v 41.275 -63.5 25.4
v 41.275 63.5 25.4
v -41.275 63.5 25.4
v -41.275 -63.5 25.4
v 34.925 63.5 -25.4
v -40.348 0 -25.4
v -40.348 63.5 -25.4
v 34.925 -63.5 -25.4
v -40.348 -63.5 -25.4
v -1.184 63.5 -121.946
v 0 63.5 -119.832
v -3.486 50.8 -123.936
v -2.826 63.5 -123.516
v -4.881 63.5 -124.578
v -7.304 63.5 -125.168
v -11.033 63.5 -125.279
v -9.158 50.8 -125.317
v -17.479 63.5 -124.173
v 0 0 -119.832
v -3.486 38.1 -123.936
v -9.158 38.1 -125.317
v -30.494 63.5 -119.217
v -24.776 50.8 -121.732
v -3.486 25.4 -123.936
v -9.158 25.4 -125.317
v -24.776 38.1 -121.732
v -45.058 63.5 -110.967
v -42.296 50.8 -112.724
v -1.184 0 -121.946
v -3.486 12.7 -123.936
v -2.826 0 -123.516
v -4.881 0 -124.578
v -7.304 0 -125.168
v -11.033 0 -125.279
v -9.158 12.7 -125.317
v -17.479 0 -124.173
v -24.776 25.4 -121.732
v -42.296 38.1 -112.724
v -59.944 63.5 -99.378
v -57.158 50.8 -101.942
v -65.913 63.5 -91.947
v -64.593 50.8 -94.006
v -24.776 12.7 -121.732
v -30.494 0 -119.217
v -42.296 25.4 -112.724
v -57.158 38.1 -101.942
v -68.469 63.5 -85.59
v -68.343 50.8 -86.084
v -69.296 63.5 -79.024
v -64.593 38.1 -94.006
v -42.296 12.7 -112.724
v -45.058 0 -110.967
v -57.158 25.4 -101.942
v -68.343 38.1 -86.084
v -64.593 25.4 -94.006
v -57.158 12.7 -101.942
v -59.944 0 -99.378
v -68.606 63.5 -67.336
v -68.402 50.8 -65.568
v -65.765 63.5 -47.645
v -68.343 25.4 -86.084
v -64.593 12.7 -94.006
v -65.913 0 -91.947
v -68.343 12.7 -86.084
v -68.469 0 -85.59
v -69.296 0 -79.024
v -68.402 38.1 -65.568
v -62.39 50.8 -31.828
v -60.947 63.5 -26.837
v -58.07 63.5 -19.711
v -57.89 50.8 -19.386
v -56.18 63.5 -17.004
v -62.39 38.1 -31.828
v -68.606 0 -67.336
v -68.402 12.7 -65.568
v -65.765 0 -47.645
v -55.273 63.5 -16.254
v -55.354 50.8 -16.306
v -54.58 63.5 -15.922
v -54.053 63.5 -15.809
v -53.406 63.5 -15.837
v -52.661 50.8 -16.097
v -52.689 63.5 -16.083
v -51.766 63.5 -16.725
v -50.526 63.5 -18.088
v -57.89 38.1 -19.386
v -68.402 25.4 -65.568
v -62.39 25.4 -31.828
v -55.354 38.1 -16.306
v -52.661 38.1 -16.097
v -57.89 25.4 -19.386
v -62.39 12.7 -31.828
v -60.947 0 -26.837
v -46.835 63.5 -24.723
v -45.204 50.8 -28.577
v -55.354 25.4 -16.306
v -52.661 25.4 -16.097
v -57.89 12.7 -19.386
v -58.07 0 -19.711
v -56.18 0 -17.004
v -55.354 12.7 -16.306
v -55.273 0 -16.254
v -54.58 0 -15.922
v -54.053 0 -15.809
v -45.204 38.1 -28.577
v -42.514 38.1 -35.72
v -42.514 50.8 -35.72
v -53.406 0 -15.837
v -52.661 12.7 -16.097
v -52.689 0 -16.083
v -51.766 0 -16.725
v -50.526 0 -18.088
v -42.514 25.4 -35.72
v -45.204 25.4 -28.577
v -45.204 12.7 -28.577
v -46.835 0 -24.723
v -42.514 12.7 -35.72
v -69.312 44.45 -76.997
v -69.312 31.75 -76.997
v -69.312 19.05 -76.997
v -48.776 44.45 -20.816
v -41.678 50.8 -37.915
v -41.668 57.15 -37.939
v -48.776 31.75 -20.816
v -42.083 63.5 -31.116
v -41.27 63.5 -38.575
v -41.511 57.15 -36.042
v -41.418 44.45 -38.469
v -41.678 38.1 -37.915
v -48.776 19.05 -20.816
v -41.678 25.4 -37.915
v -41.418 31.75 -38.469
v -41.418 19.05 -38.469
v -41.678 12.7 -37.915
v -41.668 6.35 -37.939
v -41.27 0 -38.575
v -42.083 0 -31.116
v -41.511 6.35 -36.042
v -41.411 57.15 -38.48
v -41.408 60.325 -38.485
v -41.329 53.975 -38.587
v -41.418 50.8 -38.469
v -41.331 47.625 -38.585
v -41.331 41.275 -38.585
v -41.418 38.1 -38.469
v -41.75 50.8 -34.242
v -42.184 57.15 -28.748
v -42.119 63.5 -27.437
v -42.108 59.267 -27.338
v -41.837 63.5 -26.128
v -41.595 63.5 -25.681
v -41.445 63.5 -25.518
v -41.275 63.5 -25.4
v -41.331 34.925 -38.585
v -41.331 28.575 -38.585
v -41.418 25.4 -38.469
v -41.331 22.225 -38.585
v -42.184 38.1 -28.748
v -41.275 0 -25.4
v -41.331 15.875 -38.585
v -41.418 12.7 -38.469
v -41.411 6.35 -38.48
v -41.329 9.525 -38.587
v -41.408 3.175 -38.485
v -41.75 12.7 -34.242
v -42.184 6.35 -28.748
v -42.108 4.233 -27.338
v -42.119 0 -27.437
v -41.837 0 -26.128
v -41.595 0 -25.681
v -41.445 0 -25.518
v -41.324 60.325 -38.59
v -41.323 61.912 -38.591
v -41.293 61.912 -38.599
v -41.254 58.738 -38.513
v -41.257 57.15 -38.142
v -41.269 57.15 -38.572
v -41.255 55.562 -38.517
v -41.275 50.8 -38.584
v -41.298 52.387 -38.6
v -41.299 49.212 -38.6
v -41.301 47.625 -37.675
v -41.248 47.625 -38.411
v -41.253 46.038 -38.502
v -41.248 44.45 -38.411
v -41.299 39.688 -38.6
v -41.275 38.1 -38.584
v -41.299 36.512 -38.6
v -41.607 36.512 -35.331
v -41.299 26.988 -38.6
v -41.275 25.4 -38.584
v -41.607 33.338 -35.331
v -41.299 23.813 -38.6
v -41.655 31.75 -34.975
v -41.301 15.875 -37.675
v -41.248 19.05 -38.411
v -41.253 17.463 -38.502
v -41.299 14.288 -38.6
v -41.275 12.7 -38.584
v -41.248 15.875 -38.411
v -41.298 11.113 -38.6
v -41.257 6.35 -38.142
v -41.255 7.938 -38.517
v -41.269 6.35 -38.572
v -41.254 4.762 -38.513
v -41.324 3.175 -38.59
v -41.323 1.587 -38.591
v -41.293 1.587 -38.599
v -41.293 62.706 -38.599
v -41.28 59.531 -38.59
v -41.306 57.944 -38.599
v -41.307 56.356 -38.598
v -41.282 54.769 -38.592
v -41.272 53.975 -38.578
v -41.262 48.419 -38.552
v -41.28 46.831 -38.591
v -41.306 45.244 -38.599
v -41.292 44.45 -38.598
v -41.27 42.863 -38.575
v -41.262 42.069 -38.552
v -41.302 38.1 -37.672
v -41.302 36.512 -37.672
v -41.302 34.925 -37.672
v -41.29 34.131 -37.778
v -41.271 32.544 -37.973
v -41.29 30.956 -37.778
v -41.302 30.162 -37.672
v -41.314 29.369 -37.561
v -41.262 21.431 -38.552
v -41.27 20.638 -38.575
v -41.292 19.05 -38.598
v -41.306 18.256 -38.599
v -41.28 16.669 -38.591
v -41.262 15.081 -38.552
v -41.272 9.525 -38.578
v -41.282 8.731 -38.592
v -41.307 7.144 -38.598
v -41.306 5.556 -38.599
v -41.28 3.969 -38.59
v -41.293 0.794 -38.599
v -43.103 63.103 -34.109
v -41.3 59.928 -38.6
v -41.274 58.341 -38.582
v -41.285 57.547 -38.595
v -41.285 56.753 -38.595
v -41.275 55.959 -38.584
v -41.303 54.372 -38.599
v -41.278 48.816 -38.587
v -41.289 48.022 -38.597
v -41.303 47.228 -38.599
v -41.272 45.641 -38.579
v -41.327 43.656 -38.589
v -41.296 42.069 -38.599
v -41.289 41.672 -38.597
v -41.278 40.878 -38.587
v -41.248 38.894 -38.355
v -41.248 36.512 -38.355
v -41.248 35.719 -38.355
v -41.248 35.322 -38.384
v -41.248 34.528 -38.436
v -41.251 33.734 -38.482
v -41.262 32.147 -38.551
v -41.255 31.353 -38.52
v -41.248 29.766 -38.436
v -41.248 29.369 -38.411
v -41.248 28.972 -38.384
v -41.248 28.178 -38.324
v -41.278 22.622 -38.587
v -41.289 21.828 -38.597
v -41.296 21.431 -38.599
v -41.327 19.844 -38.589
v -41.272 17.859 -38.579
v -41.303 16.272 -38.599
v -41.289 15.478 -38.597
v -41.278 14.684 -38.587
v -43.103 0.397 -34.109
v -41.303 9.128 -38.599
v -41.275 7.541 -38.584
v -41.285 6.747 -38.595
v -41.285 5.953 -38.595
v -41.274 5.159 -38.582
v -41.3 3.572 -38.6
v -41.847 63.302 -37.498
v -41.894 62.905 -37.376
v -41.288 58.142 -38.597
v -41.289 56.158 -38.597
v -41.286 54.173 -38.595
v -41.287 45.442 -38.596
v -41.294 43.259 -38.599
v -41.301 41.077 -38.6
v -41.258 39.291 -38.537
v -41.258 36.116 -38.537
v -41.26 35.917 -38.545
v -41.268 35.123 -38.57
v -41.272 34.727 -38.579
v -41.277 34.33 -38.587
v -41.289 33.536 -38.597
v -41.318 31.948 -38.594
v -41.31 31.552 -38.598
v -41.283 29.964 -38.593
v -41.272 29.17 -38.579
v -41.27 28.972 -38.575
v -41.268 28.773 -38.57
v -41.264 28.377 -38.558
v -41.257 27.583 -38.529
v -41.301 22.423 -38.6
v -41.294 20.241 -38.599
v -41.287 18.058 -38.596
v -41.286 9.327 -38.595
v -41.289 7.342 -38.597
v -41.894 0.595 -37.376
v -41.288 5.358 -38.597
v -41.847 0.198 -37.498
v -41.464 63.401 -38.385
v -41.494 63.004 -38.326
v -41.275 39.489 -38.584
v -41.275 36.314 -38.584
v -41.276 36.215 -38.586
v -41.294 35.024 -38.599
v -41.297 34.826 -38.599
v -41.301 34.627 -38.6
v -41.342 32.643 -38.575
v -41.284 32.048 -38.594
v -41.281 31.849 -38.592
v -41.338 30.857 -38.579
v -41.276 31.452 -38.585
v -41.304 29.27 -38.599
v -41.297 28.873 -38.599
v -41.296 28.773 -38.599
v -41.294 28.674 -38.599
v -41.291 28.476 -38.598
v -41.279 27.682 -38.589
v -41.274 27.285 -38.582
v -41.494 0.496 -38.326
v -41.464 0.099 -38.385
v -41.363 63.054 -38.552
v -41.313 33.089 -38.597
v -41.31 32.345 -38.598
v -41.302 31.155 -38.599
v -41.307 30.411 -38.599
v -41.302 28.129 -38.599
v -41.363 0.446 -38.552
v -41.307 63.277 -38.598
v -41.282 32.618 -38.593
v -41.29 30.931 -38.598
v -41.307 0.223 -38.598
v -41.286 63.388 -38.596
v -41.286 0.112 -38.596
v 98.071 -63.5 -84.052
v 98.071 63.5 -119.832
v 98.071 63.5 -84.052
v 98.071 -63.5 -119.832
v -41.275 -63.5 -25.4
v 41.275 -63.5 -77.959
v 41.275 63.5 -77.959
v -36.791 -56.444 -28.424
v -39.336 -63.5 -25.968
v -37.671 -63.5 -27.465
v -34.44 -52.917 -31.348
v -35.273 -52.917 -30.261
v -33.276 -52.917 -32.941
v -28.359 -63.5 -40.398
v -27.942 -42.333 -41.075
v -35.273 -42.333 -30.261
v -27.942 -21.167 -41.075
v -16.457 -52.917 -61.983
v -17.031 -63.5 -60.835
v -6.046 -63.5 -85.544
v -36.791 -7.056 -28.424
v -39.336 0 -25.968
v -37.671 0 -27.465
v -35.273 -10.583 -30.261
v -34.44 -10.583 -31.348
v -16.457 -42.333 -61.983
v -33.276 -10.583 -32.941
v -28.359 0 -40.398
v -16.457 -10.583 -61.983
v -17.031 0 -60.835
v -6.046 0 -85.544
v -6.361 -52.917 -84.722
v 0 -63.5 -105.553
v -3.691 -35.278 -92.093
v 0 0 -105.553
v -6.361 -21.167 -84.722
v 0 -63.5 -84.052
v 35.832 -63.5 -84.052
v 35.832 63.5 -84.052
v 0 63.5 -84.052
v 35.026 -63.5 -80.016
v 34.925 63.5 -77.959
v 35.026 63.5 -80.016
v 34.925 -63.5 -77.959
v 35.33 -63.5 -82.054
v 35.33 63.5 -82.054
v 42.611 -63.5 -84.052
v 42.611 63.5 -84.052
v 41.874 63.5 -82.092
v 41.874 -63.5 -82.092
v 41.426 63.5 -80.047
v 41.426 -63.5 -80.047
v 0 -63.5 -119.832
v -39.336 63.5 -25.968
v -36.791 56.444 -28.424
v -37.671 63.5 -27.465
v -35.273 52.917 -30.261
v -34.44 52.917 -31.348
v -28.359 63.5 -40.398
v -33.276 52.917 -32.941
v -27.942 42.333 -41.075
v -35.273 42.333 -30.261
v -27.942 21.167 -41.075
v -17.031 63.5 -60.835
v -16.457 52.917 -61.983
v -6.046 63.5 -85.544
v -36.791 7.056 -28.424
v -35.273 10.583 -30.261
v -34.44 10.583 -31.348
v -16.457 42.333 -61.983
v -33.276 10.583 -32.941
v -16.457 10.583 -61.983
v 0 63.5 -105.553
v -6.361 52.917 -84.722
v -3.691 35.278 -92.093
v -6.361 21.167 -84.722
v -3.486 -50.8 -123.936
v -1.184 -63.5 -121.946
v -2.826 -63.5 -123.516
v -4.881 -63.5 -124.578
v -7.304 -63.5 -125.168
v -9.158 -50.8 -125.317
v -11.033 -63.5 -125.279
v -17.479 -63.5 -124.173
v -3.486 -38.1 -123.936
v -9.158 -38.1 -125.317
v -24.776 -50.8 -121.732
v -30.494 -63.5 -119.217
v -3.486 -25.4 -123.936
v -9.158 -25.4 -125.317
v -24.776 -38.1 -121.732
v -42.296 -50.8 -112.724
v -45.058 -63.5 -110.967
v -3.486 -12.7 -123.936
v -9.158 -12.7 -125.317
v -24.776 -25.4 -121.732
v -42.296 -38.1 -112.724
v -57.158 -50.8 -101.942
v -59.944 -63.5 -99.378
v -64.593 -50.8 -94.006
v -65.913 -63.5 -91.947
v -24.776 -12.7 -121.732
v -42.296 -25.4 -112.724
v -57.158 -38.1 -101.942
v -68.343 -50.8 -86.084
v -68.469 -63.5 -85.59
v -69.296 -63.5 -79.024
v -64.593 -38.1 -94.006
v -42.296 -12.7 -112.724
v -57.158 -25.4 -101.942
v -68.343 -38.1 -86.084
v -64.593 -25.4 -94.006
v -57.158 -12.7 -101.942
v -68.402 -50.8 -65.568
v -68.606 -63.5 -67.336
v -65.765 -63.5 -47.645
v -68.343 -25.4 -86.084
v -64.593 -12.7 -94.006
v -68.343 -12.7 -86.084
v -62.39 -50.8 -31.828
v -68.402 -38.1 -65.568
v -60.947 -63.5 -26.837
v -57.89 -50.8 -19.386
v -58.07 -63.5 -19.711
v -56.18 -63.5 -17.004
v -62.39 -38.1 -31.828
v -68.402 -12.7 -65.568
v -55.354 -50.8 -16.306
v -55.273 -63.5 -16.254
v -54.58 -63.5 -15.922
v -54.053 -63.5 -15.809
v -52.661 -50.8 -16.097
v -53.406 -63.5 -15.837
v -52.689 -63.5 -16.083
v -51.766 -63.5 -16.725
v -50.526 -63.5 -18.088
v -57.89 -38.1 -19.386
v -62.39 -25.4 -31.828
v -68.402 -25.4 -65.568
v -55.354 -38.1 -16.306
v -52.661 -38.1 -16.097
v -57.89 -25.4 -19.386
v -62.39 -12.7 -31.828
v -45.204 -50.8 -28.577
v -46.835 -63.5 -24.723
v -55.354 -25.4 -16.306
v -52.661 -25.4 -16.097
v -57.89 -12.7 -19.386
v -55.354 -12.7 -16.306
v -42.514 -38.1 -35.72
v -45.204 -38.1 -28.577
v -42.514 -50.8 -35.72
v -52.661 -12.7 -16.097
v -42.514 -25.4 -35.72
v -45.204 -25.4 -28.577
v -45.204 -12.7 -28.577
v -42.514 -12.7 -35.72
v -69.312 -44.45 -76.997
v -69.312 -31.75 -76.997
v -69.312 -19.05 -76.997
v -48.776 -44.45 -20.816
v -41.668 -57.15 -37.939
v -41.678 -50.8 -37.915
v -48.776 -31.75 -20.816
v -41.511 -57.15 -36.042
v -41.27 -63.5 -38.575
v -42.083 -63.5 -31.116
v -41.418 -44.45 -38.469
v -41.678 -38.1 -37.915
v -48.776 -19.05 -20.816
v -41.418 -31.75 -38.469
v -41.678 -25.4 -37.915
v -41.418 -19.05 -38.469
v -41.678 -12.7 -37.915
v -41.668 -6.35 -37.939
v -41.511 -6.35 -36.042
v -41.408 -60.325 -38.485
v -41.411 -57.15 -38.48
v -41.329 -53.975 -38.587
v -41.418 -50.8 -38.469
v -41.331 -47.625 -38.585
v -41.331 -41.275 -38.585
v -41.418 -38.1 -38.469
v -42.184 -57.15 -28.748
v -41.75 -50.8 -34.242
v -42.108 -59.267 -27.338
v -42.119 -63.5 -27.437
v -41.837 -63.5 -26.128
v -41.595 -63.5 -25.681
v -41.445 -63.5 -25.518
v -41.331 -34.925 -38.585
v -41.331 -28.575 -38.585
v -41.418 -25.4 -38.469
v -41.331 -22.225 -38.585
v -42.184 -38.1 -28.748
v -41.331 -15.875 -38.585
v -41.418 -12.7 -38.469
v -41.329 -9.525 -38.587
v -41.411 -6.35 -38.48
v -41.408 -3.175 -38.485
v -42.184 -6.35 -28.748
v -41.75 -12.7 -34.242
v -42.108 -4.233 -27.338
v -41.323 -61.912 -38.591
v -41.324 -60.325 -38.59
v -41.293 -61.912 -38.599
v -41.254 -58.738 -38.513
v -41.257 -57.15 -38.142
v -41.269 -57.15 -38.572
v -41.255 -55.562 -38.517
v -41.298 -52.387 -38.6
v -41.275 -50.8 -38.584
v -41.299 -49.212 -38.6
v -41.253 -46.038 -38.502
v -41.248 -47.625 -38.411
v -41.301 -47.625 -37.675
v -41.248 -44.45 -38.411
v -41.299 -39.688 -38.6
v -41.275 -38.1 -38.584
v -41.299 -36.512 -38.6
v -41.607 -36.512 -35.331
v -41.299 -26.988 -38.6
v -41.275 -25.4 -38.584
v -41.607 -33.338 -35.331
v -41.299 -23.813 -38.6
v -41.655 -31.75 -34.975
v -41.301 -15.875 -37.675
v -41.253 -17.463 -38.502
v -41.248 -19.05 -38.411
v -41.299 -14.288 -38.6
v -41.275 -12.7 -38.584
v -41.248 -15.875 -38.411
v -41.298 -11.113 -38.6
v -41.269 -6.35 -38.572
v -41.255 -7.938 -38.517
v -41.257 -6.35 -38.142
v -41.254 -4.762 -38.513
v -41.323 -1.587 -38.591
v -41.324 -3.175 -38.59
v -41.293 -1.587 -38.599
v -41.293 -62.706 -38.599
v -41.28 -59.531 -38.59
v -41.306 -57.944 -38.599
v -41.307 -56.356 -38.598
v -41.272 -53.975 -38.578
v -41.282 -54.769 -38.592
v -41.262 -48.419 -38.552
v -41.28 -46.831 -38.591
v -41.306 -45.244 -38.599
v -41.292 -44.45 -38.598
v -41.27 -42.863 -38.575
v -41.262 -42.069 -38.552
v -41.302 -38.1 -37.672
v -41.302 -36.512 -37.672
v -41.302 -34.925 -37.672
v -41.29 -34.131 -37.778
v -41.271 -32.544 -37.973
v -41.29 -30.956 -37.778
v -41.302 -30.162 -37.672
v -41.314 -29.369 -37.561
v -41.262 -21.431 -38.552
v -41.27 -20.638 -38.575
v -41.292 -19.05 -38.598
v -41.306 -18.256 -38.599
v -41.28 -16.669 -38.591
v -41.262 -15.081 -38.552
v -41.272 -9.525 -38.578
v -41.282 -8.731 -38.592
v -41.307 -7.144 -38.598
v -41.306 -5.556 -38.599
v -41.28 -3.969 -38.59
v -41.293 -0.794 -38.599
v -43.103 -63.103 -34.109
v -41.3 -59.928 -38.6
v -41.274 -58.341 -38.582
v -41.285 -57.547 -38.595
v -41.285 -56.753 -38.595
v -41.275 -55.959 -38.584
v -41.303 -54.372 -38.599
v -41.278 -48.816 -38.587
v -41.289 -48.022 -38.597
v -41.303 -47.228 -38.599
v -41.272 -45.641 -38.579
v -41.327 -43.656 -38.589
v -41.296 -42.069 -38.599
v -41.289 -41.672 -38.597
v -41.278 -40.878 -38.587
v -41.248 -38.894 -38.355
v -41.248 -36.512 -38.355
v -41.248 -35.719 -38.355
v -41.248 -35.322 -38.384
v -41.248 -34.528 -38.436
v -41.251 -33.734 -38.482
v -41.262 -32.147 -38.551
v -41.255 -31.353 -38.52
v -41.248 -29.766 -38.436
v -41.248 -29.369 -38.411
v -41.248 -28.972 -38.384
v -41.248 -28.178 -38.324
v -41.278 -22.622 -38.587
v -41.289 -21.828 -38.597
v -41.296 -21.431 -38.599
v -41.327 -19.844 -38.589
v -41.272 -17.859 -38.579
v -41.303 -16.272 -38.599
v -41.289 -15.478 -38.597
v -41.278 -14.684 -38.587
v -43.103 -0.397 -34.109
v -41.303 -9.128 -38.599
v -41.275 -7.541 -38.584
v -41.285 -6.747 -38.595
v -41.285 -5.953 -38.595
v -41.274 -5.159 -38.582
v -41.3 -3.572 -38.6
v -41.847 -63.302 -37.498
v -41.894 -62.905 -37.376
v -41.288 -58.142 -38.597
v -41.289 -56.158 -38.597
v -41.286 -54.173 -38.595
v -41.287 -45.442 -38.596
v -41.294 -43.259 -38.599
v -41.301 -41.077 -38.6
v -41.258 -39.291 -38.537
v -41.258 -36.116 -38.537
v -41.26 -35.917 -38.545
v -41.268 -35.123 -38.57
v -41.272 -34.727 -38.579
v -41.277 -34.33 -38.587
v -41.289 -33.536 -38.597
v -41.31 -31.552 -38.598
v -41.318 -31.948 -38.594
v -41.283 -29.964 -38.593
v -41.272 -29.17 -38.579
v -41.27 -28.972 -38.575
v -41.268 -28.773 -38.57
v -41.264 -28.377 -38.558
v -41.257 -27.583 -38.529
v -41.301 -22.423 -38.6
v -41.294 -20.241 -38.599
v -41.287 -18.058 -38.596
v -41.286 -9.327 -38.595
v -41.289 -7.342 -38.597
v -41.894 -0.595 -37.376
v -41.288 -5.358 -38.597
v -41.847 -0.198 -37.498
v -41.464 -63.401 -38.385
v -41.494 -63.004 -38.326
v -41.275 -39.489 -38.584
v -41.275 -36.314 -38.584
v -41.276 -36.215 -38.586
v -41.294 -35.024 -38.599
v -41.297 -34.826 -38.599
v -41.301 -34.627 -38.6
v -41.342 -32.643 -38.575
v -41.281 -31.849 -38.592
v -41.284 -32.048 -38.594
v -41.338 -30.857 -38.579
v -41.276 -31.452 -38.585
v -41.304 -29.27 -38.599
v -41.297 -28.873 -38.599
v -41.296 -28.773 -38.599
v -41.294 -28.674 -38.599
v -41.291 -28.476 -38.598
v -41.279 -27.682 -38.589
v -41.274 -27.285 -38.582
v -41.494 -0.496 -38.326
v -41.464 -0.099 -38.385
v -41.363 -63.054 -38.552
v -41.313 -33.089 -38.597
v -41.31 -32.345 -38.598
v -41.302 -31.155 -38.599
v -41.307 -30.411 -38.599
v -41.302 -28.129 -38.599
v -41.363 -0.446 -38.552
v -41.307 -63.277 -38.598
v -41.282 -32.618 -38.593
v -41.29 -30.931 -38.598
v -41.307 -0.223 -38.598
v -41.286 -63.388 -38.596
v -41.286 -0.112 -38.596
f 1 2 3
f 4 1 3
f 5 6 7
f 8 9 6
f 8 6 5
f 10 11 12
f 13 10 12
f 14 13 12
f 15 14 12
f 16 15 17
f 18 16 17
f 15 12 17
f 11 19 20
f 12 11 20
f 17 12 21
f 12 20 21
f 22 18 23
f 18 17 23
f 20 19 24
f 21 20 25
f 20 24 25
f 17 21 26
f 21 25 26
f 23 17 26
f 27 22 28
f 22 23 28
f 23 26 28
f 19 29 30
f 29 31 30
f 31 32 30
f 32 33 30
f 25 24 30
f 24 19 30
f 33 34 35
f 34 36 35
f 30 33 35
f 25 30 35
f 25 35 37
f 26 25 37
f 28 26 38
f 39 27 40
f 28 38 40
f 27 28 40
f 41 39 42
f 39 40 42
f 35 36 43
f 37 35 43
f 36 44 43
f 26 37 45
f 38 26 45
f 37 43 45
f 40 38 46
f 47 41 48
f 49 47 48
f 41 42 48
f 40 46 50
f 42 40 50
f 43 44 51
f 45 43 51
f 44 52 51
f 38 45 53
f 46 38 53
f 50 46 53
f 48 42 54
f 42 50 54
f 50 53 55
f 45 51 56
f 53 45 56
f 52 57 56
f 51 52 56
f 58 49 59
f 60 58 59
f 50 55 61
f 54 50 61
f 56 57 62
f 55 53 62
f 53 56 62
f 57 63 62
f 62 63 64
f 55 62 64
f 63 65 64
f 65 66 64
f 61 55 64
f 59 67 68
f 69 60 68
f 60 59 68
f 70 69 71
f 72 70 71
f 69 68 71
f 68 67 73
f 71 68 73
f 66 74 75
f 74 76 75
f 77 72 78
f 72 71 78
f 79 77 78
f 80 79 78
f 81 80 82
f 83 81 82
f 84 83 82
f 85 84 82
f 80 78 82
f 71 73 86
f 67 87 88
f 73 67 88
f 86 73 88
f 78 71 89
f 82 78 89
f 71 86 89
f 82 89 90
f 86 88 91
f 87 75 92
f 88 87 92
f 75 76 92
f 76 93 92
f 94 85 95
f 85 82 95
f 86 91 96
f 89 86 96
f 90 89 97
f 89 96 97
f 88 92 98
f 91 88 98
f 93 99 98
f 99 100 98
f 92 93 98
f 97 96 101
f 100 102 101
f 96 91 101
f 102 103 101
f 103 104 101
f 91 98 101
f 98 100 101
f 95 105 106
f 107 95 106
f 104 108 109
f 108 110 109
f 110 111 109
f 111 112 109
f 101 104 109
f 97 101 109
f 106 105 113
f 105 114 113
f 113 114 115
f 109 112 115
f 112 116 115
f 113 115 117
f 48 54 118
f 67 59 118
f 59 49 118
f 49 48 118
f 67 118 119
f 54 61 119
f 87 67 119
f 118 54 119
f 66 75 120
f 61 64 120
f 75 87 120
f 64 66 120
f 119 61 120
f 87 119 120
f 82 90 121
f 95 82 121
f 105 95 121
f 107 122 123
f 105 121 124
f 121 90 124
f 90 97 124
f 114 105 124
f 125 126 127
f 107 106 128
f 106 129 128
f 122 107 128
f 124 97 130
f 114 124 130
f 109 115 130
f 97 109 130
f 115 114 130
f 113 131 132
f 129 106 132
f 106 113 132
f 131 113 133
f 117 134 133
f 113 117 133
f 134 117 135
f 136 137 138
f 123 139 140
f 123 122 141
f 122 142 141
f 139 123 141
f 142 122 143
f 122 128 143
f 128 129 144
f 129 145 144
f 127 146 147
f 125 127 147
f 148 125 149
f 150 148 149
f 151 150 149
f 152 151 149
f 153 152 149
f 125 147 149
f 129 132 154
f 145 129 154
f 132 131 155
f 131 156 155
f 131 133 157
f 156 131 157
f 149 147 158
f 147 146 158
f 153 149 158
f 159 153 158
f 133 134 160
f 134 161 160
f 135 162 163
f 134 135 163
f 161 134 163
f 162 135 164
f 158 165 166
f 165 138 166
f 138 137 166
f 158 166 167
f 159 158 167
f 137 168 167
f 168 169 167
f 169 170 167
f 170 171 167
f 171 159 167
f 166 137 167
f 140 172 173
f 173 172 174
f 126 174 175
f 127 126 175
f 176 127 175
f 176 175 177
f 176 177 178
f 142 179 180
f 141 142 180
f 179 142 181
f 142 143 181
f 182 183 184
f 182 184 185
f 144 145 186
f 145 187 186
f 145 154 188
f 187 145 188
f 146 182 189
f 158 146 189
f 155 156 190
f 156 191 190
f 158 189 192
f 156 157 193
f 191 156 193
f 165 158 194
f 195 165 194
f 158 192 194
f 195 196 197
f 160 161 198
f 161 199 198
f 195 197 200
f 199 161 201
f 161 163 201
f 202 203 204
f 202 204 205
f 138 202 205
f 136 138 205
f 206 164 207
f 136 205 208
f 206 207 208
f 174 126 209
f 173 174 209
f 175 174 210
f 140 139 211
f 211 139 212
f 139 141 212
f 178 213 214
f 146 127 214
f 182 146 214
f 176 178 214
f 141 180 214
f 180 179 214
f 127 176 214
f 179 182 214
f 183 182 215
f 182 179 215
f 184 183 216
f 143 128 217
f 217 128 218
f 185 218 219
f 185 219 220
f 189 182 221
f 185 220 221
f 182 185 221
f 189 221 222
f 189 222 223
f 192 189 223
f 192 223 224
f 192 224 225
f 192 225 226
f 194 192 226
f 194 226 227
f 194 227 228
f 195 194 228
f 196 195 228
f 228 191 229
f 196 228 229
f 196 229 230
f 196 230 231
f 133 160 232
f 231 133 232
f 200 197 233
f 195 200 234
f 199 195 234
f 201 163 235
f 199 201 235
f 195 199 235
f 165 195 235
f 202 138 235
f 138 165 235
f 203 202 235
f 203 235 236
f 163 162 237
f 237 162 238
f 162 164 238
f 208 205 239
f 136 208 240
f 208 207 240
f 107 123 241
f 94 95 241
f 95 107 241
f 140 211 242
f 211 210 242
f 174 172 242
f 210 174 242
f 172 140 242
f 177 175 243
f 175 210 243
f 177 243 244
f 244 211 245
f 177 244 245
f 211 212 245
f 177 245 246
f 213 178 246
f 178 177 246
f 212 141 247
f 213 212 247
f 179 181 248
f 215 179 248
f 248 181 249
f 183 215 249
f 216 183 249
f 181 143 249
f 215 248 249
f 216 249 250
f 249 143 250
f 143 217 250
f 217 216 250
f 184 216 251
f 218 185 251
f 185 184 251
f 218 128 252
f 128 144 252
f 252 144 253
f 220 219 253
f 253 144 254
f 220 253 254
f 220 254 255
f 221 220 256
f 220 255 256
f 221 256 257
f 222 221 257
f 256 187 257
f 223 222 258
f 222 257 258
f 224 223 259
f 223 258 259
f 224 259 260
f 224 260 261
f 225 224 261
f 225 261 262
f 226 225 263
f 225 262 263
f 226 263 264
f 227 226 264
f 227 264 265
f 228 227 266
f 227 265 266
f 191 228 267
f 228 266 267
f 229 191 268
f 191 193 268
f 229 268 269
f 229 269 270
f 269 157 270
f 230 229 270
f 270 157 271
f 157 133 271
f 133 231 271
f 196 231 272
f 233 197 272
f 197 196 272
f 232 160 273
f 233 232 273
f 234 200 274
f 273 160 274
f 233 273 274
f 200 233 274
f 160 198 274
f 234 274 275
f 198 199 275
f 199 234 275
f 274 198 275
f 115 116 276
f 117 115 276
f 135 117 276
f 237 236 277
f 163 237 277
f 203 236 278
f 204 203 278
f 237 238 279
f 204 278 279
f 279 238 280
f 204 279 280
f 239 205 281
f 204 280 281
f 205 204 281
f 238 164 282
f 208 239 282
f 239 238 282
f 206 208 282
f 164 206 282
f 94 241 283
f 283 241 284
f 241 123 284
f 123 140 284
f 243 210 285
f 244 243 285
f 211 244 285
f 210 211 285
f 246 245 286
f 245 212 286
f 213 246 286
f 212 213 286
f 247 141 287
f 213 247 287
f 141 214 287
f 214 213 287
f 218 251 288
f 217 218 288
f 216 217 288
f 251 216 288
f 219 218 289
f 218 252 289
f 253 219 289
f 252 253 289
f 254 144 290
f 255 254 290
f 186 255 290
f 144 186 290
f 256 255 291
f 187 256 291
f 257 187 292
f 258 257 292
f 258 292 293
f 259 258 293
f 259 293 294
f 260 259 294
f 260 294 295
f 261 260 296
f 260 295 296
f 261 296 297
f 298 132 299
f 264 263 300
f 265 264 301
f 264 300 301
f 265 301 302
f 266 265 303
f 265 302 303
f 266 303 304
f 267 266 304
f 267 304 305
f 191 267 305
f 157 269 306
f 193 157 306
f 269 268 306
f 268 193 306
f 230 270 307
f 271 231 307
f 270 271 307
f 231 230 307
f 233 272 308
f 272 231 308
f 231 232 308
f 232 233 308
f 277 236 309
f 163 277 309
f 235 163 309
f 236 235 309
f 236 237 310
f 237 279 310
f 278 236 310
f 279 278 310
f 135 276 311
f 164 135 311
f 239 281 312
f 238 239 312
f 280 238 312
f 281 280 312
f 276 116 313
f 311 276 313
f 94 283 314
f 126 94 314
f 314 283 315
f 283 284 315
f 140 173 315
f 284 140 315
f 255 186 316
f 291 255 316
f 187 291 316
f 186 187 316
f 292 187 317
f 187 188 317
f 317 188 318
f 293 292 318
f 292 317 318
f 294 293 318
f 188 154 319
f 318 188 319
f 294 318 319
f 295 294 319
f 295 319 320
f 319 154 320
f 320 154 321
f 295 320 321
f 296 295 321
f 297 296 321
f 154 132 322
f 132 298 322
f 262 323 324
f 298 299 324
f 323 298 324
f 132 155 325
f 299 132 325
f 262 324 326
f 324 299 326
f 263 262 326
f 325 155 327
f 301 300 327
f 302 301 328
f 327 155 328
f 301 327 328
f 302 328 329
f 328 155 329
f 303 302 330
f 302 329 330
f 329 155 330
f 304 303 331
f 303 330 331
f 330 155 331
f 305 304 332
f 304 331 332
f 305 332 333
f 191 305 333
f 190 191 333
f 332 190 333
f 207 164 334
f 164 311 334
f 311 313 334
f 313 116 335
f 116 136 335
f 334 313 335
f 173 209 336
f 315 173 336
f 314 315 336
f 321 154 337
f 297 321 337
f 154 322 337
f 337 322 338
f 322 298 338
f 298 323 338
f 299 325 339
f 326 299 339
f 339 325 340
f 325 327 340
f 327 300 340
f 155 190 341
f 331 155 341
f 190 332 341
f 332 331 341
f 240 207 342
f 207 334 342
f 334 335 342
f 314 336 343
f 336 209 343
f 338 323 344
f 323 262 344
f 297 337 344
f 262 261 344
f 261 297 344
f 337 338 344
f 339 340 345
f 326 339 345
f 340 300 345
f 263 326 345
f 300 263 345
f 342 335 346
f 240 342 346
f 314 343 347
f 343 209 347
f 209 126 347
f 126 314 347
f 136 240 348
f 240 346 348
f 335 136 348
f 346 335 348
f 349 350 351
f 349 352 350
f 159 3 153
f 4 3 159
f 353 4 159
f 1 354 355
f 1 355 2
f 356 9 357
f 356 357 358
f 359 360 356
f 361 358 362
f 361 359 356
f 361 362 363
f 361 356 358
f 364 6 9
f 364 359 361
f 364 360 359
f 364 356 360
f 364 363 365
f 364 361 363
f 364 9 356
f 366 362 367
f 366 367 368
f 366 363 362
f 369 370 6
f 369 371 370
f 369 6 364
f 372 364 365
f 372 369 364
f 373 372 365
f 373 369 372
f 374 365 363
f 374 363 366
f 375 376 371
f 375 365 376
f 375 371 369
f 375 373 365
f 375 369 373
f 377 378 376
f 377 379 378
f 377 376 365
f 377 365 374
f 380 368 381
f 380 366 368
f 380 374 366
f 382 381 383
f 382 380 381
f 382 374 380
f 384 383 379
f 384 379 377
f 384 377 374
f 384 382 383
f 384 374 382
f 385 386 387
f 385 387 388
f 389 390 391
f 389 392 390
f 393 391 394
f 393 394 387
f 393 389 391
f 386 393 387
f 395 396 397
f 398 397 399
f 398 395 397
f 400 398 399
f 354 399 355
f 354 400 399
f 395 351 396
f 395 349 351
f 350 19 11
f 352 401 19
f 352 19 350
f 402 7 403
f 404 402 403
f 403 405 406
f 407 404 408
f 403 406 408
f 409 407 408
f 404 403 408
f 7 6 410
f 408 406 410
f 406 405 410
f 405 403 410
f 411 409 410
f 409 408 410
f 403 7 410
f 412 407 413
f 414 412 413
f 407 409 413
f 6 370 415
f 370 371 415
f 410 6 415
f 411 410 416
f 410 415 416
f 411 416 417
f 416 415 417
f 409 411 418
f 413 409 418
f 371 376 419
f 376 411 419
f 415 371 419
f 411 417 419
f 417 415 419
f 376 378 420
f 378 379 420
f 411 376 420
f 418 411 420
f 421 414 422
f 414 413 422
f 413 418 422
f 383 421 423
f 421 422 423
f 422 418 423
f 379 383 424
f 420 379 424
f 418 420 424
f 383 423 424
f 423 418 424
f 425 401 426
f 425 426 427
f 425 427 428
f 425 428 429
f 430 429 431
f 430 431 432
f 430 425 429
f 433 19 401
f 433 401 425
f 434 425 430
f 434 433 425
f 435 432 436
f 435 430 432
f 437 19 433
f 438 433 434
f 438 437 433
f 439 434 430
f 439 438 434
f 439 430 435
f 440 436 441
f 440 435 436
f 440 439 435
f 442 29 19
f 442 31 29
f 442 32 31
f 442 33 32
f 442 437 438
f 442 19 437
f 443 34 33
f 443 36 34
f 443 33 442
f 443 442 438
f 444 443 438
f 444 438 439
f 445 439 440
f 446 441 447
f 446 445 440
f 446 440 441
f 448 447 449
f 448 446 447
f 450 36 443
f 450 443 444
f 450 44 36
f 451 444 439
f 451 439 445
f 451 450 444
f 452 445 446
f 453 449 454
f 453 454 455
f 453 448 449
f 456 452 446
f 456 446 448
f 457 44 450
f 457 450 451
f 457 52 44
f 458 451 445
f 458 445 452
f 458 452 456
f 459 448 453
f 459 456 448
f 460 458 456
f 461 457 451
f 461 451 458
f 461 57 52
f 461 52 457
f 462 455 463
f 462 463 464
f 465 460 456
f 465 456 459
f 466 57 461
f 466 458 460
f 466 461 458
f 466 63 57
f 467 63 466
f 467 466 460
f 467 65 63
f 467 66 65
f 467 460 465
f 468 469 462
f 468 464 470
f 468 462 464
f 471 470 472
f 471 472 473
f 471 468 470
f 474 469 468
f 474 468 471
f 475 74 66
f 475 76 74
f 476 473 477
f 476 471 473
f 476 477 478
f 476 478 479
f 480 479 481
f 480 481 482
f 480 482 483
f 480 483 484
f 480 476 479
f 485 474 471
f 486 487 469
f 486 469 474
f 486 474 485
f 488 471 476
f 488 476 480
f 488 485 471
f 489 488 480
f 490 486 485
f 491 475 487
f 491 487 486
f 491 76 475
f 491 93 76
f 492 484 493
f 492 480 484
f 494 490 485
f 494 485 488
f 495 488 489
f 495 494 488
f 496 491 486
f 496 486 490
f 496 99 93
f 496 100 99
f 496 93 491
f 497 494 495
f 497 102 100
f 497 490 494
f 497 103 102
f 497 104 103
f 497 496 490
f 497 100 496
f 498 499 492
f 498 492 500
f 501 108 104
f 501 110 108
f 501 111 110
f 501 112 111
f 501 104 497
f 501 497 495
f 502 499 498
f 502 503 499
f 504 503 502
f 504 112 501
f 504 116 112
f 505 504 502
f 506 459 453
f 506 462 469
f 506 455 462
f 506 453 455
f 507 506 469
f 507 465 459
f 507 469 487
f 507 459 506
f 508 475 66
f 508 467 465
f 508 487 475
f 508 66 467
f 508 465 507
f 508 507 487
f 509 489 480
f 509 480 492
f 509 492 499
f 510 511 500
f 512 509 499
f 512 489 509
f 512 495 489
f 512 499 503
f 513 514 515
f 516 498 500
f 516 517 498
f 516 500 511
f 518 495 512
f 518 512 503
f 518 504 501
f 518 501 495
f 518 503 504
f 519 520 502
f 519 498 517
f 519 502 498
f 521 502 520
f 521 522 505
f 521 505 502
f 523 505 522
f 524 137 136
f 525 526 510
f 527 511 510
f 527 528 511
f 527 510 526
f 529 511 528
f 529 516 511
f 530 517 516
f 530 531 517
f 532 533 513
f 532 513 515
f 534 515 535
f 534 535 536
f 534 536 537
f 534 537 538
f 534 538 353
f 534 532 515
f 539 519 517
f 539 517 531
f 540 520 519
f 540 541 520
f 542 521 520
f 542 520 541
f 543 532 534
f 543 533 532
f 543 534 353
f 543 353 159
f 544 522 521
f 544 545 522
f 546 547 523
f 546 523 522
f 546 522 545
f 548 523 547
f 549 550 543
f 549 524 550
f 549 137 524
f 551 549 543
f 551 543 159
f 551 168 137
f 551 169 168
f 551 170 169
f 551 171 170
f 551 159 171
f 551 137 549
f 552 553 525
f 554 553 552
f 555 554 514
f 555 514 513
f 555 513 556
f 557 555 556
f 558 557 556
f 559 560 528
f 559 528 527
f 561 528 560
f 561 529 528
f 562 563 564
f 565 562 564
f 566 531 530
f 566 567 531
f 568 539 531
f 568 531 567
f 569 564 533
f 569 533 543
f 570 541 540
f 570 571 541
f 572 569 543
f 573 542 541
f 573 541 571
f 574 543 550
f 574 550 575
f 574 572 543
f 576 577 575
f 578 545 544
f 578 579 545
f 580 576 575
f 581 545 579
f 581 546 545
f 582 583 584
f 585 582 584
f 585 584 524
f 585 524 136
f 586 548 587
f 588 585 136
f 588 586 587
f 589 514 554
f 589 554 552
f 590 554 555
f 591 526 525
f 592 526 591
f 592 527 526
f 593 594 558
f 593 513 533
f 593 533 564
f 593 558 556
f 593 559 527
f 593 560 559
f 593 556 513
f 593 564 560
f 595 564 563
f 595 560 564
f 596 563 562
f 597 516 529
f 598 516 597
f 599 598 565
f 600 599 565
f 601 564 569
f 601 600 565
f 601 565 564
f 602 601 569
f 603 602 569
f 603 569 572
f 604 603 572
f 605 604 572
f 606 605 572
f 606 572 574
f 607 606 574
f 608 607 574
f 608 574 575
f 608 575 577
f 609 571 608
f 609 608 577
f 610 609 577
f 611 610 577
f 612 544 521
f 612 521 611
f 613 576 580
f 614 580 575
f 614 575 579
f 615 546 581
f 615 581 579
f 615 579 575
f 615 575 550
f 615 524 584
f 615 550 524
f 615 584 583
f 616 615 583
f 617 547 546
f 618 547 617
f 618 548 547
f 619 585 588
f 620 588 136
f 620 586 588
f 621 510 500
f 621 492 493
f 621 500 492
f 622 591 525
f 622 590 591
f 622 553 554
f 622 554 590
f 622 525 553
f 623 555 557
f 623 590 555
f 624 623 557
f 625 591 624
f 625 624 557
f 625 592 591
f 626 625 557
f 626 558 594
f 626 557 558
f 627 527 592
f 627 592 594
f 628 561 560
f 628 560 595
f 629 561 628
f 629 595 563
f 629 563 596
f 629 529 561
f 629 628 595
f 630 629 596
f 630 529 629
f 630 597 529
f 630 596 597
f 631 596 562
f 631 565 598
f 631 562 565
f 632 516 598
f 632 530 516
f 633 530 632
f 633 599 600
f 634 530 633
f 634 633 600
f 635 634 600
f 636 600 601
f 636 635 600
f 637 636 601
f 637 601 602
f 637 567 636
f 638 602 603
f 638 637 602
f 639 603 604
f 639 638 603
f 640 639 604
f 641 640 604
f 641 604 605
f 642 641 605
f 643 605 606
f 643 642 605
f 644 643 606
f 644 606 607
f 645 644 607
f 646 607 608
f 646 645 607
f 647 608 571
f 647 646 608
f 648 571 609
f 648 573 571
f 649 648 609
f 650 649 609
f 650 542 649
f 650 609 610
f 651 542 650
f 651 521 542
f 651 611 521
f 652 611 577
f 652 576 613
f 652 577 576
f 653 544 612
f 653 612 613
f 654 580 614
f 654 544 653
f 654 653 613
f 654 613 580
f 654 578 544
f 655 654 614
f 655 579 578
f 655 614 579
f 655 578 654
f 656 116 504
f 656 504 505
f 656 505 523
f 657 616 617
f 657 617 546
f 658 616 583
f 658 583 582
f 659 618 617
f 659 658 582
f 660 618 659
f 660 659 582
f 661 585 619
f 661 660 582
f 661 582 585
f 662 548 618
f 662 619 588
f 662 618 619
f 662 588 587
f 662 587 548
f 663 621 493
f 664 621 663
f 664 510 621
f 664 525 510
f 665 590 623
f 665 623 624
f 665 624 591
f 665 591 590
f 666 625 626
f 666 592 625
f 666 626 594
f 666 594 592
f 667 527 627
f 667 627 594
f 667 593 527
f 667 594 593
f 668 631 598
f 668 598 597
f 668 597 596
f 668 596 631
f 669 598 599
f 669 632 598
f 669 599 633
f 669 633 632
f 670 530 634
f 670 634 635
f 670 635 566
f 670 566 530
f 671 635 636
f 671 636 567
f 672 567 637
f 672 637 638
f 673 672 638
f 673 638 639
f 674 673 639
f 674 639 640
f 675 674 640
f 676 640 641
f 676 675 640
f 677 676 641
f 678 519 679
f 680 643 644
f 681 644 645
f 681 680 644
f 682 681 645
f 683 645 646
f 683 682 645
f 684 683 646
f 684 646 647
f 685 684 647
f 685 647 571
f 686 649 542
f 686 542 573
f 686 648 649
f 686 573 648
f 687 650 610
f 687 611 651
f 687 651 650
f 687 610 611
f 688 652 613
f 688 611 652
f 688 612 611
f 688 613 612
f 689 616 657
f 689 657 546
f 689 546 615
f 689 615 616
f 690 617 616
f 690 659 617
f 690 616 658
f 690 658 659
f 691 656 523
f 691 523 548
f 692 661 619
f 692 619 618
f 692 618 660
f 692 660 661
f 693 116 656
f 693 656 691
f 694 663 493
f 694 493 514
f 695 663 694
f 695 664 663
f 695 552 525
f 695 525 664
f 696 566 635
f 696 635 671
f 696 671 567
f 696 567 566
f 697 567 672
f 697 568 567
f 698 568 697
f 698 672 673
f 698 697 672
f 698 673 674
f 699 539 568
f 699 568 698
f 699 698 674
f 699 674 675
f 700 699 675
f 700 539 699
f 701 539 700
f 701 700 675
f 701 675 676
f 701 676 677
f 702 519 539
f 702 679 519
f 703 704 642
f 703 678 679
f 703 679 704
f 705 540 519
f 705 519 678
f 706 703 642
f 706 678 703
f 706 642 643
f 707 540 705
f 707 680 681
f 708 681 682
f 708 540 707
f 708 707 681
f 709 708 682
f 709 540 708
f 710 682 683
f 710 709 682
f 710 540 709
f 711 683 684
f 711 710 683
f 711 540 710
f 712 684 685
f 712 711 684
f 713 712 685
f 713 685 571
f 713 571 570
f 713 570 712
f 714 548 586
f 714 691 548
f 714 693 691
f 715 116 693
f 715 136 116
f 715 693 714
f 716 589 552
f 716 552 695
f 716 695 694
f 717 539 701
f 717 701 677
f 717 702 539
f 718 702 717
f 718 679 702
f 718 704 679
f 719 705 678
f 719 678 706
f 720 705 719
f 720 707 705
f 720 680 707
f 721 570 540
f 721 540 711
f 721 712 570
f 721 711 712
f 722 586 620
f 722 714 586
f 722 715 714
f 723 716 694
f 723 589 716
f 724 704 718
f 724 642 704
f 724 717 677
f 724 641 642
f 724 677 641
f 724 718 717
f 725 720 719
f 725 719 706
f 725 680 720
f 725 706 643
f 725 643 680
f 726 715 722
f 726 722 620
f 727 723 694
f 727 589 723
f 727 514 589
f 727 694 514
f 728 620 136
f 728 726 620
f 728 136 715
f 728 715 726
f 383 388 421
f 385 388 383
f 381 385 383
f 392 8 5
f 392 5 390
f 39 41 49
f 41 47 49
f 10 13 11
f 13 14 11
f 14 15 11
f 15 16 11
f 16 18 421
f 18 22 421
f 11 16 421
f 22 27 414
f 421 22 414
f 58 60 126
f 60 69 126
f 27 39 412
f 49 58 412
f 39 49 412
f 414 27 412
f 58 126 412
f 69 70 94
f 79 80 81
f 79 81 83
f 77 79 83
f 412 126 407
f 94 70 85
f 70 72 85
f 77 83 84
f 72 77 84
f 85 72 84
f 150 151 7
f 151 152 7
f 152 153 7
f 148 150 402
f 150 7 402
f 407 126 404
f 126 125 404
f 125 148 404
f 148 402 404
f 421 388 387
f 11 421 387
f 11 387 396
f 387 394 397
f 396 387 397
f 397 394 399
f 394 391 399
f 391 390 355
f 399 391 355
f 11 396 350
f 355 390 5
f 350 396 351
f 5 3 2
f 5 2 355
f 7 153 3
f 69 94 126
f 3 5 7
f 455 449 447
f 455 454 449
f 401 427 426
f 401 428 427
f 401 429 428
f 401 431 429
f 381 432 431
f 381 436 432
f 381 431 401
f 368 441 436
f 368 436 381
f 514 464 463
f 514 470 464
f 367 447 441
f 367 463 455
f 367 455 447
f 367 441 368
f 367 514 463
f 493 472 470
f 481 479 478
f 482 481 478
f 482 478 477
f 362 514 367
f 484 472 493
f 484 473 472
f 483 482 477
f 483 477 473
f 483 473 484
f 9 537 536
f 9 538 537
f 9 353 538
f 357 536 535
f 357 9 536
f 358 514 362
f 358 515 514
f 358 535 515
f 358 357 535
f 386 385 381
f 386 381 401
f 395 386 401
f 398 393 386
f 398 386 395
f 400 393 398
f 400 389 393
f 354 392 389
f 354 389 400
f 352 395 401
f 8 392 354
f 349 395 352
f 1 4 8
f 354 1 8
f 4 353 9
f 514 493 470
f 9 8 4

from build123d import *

# Parameters (mm, degrees)
F1_DEPTH = 63.5


with BuildPart() as f1:
    # F0 (on Front) → F1 (new body, symmetric)
    with BuildSketch(Plane.XZ):
        with BuildLine():
            Line((41.275, -25.4), (41.275, 25.4))
            Line((41.275, 25.4), (-41.275, 25.4))
            Line((-41.275, 25.4), (-41.275, -25.4))
            add(Edge.make_bspline(
                [(-41.275, -25.4), (-41.0251631495, -25.2682209146), (-40.7143381803, -25.2713703549), (-40.3484325882, -25.4)],
                knots=[0, 0, 0, 0, 0.0103639822, 0.0103639822, 0.0103639822, 0.0103639822], degree=3))
            Line((-40.3484325882, -25.4), (34.925, -25.4))
            Line((34.925, -25.4), (41.275, -25.4))
        make_face()
        with BuildLine():
            Line((41.275, -77.9587051659), (41.275, -25.4))
            Line((41.275, -25.4), (34.925, -25.4))
            Line((34.925, -25.4), (34.925, -77.9587051659))
            ThreePointArc((34.925, -77.9587051659), (35.1530806437, -81.0389325154), (35.8323476668, -84.0519737723))
            Line((35.8323476668, -84.0519737723), (42.6109915941, -84.0519737723))
            ThreePointArc((42.6109915941, -84.0519737723), (41.6129183385, -81.0777112516), (41.275, -77.9587051659))
        make_face()
        with BuildLine():
            add(Edge.make_bspline(
                [(-41.275, -25.4), (-41.0251631495, -25.2682209146), (-40.7143381803, -25.2713703549), (-40.3484325882, -25.4)],
                knots=[0, 0, 0, 0, 0.0103639822, 0.0103639822, 0.0103639822, 0.0103639822], degree=3))
            Line((-41.275, -25.4), (-40.3484325882, -25.4))
        make_face()
        with BuildLine():
            Line((-40.3484325882, -25.4), (-41.275, -25.4))
            add(Edge.make_bspline(
                [(0, -119.8317275898), (-5.8774254103, -134.8138000546), (-69.2546435796, -100.7846524204), (-71.0942813509, -73.6224732662), (-55.8768987696, 10.7005844338), (-37.4986467676, -54.0770153592), (-43.467744841, -26.5565864246), (-41.275, -25.4)],
                knots=[0.2543174283, 0.2543174283, 0.2543174283, 0.2543174283, 0.4481918638, 0.6027655534, 0.7832677282, 0.9090383647, 1, 1, 1, 1], degree=3))
            Line((0, -119.8317275898), (0, -105.5528684028))
            add(Edge.make_bspline(
                [(-40.3484325882, -25.4), (-33.2519579826, -27.8946790369), (-5.4375679655, -77.5872315187), (0, -105.5528684028)],
                knots=[0.0103639822, 0.0103639822, 0.0103639822, 0.0103639822, 0.2113659292, 0.2113659292, 0.2113659292, 0.2113659292], degree=3))
        make_face()
        with BuildLine():
            add(Edge.make_bspline(
                [(0, -105.5528684028), (1.1619374778, -111.5287608959), (1.3021016993, -116.5125562428), (0, -119.8317275898)],
                knots=[0.2113659292, 0.2113659292, 0.2113659292, 0.2113659292, 0.2543174283, 0.2543174283, 0.2543174283, 0.2543174283], degree=3))
            Line((0, -119.8317275898), (98.0712024719, -119.8317275898))
            Line((98.0712024719, -119.8317275898), (98.0712024719, -84.0519737723))
            Line((98.0712024719, -84.0519737723), (75.8441797926, -84.0519737723))
            ThreePointArc((75.8441797926, -84.0519737723), (55.8382637297, -98.8719688955), (35.8323476668, -84.0519737723))
            Line((35.8323476668, -84.0519737723), (0, -84.0519737723))
            Line((0, -84.0519737723), (0, -105.5528684028))
        make_face()
        with BuildLine():
            Line((0, -105.5528684028), (0, -119.8317275898))
            add(Edge.make_bspline(
                [(0, -105.5528684028), (1.1619374778, -111.5287608959), (1.3021016993, -116.5125562428), (0, -119.8317275898)],
                knots=[0.2113659292, 0.2113659292, 0.2113659292, 0.2113659292, 0.2543174283, 0.2543174283, 0.2543174283, 0.2543174283], degree=3))
        make_face()
        with BuildLine():
            ThreePointArc((69.0655358653, -84.0519737723), (55.8382637297, -92.5219688955), (42.6109915941, -84.0519737723))
            Line((42.6109915941, -84.0519737723), (35.8323476668, -84.0519737723))
            ThreePointArc((35.8323476668, -84.0519737723), (55.8382637297, -98.8719688955), (75.8441797926, -84.0519737723))
            Line((75.8441797926, -84.0519737723), (69.0655358653, -84.0519737723))
        make_face()
        with BuildLine():
            Line((69.0655358653, -84.0519737723), (42.6109915941, -84.0519737723))
            ThreePointArc((42.6109915941, -84.0519737723), (55.8382637297, -92.5219688955), (69.0655358653, -84.0519737723))
        make_face()
    extrude(amount=F1_DEPTH, both=True)


solid = f1.part
